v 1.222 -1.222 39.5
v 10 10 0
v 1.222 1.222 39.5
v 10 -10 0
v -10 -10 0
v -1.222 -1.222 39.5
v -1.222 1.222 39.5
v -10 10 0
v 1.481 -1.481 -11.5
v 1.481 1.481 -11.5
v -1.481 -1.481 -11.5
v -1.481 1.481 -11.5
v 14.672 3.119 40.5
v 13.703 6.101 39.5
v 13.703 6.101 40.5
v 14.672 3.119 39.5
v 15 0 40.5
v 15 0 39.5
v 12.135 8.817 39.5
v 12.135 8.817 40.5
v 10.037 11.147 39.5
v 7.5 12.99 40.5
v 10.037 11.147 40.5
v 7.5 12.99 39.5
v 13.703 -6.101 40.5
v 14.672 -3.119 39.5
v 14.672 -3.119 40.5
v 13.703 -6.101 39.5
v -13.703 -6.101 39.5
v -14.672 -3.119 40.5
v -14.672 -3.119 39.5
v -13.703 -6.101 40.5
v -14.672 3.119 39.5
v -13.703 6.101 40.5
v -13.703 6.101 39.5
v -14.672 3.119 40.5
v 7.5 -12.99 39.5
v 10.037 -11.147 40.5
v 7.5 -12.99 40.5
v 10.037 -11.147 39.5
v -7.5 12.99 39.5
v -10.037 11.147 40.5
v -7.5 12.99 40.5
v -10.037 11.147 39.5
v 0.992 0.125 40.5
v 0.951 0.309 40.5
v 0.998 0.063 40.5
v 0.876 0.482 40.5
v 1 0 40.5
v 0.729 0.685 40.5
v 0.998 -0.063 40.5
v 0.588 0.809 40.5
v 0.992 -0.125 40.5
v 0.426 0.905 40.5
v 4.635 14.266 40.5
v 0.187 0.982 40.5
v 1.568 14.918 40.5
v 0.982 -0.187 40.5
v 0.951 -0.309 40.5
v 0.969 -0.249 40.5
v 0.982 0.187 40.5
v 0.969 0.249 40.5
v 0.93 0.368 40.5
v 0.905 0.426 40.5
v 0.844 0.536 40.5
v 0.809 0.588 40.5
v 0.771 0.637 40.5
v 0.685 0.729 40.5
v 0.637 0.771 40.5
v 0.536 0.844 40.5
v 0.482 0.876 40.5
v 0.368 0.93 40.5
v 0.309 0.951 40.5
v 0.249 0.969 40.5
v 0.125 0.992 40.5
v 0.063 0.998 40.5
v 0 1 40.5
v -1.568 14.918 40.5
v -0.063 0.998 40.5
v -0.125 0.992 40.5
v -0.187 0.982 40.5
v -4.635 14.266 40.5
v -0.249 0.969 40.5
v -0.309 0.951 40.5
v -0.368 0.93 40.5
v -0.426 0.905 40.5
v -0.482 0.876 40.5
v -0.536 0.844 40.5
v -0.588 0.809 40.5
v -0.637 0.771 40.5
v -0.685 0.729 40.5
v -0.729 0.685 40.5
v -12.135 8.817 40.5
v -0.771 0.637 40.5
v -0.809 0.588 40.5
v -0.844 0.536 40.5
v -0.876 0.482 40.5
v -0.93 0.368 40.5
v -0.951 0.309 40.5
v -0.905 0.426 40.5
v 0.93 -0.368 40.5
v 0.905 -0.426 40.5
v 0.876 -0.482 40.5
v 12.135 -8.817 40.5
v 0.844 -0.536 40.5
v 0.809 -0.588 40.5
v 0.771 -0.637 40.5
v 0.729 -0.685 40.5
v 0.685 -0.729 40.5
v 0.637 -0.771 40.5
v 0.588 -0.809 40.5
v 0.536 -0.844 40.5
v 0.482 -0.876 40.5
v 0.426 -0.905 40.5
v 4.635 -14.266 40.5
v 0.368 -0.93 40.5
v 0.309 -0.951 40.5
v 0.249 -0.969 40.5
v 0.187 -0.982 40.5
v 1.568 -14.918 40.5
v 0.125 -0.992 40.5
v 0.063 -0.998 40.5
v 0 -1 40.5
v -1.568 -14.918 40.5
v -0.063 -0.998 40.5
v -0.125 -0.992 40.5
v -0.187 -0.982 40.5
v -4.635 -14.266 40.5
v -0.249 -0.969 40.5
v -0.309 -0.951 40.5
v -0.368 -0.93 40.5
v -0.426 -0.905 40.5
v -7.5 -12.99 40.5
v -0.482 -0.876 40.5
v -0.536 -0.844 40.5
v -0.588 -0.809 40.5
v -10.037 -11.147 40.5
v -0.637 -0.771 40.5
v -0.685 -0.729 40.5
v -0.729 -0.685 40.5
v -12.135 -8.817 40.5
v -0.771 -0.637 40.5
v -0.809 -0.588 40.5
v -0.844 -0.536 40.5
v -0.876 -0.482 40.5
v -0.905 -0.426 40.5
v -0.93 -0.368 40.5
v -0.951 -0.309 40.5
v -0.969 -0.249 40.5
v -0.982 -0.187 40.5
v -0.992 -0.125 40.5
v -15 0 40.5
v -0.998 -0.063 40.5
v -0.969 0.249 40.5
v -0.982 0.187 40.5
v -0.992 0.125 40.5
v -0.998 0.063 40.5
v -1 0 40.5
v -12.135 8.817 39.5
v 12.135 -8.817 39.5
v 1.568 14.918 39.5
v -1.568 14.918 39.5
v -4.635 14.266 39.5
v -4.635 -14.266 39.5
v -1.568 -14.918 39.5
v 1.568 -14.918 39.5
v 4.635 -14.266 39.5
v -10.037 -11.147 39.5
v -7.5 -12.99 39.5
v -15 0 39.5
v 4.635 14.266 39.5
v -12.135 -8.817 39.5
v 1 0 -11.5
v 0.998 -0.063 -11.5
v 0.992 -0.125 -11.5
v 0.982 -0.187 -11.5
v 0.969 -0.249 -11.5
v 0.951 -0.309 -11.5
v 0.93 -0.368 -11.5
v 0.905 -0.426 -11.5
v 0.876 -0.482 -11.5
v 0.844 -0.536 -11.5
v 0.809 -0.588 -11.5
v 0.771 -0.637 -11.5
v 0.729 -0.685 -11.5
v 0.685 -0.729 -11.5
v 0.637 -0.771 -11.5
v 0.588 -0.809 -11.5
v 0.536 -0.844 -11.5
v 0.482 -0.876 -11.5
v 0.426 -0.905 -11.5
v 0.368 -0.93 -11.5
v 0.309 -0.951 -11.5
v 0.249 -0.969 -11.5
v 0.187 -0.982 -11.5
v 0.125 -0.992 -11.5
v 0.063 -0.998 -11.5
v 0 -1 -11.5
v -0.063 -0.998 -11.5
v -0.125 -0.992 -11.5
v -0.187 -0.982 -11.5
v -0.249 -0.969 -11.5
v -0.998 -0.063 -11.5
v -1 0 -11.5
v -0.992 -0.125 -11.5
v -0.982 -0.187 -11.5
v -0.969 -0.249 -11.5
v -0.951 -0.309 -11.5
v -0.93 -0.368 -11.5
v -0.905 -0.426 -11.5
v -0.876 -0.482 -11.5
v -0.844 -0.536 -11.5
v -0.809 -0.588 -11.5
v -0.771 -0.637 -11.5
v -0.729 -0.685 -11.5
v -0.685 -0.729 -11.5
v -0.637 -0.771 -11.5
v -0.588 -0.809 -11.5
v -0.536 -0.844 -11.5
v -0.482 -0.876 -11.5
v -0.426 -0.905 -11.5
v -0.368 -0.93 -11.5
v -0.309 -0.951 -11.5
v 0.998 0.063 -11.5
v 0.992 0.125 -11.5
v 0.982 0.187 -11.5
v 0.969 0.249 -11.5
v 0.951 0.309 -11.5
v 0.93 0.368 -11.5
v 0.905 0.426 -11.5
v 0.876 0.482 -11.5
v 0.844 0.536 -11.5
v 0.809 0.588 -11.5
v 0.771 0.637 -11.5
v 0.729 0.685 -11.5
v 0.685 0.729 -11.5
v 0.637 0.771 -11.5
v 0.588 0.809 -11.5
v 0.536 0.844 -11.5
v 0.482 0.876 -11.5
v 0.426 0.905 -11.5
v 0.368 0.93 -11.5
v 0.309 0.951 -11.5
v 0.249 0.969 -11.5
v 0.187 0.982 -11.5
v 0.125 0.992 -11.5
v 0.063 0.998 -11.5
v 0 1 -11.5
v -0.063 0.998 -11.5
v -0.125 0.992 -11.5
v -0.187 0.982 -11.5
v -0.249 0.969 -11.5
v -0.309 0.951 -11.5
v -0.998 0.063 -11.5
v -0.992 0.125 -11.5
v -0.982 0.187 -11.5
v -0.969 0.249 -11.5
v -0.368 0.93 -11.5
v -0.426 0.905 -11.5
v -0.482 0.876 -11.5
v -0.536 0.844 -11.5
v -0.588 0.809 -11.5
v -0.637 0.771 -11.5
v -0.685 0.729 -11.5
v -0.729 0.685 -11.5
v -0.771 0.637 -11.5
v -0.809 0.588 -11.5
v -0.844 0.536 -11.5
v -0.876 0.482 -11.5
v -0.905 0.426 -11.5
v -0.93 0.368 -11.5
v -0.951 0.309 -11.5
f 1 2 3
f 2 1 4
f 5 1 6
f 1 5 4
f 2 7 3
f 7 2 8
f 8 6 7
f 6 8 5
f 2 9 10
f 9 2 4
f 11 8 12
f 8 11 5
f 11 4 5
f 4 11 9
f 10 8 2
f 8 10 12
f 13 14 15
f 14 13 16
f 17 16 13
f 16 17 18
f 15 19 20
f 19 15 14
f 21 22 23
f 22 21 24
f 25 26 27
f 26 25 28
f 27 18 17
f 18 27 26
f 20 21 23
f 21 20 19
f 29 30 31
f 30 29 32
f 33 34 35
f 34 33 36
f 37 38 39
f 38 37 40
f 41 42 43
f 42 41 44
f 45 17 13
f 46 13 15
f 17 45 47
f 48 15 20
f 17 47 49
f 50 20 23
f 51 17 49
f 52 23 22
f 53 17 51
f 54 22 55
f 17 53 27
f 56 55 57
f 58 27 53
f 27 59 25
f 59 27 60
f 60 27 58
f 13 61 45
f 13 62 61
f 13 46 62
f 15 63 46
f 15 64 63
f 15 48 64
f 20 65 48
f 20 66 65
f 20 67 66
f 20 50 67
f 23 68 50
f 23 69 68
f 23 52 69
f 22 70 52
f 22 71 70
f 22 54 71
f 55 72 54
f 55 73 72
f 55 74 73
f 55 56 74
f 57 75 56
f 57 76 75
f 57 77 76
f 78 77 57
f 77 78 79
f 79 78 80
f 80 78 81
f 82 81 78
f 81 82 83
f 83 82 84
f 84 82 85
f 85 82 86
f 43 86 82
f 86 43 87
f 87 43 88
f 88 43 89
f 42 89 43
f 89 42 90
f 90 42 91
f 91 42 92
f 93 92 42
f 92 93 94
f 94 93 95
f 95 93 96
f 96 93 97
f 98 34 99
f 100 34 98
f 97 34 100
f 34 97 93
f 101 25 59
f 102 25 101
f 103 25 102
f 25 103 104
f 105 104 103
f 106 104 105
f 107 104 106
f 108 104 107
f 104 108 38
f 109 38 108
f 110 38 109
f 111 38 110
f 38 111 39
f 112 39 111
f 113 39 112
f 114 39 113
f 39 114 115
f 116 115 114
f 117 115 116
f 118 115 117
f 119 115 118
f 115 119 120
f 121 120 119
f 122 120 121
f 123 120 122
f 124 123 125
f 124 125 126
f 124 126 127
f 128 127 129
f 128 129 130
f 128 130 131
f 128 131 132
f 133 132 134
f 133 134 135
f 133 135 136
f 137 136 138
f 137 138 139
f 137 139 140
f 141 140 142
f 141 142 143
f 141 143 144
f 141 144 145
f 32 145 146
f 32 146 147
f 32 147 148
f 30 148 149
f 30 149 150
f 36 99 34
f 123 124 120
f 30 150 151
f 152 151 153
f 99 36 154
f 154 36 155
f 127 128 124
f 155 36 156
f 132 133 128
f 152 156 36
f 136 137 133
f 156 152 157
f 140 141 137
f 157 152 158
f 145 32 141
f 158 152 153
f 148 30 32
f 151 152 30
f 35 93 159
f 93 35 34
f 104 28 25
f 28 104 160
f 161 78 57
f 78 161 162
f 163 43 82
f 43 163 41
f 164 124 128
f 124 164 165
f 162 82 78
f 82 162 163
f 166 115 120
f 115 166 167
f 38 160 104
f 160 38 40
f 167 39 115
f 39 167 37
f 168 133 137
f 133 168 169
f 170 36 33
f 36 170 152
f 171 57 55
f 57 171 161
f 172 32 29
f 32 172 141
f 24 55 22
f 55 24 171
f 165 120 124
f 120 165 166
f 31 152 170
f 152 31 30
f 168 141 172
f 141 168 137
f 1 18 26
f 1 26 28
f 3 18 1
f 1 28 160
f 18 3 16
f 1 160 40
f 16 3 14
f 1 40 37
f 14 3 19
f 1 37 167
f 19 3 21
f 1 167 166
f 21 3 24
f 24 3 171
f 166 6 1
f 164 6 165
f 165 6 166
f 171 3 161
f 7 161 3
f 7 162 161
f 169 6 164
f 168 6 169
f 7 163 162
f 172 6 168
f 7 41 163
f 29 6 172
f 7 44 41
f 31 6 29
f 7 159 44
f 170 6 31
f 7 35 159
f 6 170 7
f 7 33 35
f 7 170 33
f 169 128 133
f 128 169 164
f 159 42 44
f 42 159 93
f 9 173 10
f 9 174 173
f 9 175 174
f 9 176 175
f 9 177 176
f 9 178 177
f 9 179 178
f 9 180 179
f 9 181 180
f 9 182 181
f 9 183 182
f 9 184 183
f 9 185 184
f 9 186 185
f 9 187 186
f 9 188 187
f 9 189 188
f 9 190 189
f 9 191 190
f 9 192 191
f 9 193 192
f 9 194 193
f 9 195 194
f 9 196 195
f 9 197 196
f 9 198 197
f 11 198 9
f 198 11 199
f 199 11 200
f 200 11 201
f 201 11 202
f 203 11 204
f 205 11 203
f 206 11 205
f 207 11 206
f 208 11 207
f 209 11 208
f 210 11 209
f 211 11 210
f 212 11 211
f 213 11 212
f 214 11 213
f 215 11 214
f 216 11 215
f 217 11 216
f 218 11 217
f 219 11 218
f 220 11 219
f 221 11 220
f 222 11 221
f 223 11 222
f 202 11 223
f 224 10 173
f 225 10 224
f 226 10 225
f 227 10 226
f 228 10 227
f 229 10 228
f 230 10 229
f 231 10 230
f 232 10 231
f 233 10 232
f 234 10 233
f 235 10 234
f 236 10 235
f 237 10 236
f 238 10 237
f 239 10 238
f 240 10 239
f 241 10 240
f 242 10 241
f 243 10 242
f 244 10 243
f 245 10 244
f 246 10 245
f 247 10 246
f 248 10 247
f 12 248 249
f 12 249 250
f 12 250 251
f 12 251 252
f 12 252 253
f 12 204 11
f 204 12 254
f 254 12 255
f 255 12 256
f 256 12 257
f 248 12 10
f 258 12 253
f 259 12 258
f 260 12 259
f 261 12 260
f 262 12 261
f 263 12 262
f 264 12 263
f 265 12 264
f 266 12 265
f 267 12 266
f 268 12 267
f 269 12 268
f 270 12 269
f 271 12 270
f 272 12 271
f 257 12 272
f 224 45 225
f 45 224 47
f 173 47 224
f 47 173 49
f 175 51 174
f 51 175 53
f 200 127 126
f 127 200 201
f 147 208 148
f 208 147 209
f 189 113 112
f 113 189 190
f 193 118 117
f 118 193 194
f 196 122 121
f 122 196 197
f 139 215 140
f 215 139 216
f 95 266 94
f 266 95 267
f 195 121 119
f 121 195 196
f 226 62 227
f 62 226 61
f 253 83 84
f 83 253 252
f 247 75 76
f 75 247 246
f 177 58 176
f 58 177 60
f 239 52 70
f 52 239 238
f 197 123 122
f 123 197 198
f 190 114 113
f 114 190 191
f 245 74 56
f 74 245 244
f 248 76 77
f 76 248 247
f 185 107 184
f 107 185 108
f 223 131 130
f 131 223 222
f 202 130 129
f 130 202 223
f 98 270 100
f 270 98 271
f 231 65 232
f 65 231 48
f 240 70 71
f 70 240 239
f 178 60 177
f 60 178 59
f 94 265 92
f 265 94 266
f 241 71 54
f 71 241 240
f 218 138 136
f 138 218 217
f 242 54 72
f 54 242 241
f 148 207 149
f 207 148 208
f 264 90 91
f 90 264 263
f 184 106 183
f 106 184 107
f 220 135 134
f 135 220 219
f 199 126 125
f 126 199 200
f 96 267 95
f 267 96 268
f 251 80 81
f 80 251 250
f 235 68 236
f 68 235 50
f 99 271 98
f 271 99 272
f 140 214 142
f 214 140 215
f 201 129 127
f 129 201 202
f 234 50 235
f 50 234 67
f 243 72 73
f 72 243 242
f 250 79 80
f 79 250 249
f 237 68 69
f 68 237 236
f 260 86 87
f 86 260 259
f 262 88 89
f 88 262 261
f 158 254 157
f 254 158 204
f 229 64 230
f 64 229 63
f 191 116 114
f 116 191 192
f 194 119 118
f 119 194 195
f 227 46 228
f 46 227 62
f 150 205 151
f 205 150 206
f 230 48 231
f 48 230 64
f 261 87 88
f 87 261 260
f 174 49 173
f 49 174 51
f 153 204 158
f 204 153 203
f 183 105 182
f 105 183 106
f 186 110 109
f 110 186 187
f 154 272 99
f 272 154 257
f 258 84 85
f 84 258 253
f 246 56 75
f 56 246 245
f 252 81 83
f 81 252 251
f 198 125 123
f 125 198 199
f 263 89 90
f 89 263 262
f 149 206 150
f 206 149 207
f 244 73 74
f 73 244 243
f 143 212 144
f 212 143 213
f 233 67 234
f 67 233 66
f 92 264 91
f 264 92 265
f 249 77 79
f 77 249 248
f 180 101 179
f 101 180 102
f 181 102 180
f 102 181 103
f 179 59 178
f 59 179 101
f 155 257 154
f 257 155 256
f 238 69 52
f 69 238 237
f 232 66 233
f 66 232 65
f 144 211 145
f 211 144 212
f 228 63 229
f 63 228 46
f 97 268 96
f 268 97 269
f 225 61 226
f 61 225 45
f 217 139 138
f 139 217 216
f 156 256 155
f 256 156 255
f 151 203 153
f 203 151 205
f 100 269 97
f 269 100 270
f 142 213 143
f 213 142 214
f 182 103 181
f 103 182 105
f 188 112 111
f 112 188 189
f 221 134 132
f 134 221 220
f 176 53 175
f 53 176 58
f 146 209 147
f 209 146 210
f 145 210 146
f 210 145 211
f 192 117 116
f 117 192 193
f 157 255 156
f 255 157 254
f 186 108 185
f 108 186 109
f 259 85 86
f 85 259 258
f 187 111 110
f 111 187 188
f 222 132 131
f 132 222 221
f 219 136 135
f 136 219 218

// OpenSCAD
// file: KlaudiaHairPendantHalf.scad
module PyramidPrimitive()
{
   polyhedron(
  points=[ [10,10,0],[10,-10,0],[-10,-10,0],[-10,10,0], // the four points at base
           [0,0,45]  ],                                 // the apex point 
  faces=[ [0,1,4],[1,2,4],[2,3,4],[3,0,4],              // each triangle side
              [1,0,3],[2,1,3] ]                         // two triangles for square base
 ); 
}

module KlaudiaHairPendant()
{
    difference()
    {
        
       union()
       {
           intersection()
           {
               union()
               {
                    PyramidPrimitive();
                    scale([1,1,0.3]) mirror([0,0,1])PyramidPrimitive();
               }
               cube(79.1,center=true);
           }
            // This part is broken off after the part is printed.   
            translate([0,0,40]) cylinder(d=30,h=1,center=true);
       } 
       difference()
       {
           translate([0,0,-14]) cube(5,center=true);
       } 
       // This hole through the length of this pendant ensures the resin drains out as it is printed. 
       cylinder(d=2,h=200,$fn=100,center=true);
    }
}

module KlaudiaHairPendantCap()
{
    difference()
    {
        intersection()
        {
            scale([1.3,1.3,1.3])PyramidPrimitive();
            translate([0,0,40]) cube([15,15,15],center=true);
        }
        PyramidPrimitive();        
        translate([0,0,43]) rotate([0,90,0]) cylinder(d=3,h=200,$fn=100,center=true);
        // This hole through the length of this pendant ensures the resin drains out as it is printed. 
        cylinder(d=2,h=200,$fn=100,center=true);
    }
}

//KlaudiaHairPendant();
//KlaudiaHairPendantCap();
// main file
include <KlaudiaHairPendantHalf.scad>;

KlaudiaHairPendant();
